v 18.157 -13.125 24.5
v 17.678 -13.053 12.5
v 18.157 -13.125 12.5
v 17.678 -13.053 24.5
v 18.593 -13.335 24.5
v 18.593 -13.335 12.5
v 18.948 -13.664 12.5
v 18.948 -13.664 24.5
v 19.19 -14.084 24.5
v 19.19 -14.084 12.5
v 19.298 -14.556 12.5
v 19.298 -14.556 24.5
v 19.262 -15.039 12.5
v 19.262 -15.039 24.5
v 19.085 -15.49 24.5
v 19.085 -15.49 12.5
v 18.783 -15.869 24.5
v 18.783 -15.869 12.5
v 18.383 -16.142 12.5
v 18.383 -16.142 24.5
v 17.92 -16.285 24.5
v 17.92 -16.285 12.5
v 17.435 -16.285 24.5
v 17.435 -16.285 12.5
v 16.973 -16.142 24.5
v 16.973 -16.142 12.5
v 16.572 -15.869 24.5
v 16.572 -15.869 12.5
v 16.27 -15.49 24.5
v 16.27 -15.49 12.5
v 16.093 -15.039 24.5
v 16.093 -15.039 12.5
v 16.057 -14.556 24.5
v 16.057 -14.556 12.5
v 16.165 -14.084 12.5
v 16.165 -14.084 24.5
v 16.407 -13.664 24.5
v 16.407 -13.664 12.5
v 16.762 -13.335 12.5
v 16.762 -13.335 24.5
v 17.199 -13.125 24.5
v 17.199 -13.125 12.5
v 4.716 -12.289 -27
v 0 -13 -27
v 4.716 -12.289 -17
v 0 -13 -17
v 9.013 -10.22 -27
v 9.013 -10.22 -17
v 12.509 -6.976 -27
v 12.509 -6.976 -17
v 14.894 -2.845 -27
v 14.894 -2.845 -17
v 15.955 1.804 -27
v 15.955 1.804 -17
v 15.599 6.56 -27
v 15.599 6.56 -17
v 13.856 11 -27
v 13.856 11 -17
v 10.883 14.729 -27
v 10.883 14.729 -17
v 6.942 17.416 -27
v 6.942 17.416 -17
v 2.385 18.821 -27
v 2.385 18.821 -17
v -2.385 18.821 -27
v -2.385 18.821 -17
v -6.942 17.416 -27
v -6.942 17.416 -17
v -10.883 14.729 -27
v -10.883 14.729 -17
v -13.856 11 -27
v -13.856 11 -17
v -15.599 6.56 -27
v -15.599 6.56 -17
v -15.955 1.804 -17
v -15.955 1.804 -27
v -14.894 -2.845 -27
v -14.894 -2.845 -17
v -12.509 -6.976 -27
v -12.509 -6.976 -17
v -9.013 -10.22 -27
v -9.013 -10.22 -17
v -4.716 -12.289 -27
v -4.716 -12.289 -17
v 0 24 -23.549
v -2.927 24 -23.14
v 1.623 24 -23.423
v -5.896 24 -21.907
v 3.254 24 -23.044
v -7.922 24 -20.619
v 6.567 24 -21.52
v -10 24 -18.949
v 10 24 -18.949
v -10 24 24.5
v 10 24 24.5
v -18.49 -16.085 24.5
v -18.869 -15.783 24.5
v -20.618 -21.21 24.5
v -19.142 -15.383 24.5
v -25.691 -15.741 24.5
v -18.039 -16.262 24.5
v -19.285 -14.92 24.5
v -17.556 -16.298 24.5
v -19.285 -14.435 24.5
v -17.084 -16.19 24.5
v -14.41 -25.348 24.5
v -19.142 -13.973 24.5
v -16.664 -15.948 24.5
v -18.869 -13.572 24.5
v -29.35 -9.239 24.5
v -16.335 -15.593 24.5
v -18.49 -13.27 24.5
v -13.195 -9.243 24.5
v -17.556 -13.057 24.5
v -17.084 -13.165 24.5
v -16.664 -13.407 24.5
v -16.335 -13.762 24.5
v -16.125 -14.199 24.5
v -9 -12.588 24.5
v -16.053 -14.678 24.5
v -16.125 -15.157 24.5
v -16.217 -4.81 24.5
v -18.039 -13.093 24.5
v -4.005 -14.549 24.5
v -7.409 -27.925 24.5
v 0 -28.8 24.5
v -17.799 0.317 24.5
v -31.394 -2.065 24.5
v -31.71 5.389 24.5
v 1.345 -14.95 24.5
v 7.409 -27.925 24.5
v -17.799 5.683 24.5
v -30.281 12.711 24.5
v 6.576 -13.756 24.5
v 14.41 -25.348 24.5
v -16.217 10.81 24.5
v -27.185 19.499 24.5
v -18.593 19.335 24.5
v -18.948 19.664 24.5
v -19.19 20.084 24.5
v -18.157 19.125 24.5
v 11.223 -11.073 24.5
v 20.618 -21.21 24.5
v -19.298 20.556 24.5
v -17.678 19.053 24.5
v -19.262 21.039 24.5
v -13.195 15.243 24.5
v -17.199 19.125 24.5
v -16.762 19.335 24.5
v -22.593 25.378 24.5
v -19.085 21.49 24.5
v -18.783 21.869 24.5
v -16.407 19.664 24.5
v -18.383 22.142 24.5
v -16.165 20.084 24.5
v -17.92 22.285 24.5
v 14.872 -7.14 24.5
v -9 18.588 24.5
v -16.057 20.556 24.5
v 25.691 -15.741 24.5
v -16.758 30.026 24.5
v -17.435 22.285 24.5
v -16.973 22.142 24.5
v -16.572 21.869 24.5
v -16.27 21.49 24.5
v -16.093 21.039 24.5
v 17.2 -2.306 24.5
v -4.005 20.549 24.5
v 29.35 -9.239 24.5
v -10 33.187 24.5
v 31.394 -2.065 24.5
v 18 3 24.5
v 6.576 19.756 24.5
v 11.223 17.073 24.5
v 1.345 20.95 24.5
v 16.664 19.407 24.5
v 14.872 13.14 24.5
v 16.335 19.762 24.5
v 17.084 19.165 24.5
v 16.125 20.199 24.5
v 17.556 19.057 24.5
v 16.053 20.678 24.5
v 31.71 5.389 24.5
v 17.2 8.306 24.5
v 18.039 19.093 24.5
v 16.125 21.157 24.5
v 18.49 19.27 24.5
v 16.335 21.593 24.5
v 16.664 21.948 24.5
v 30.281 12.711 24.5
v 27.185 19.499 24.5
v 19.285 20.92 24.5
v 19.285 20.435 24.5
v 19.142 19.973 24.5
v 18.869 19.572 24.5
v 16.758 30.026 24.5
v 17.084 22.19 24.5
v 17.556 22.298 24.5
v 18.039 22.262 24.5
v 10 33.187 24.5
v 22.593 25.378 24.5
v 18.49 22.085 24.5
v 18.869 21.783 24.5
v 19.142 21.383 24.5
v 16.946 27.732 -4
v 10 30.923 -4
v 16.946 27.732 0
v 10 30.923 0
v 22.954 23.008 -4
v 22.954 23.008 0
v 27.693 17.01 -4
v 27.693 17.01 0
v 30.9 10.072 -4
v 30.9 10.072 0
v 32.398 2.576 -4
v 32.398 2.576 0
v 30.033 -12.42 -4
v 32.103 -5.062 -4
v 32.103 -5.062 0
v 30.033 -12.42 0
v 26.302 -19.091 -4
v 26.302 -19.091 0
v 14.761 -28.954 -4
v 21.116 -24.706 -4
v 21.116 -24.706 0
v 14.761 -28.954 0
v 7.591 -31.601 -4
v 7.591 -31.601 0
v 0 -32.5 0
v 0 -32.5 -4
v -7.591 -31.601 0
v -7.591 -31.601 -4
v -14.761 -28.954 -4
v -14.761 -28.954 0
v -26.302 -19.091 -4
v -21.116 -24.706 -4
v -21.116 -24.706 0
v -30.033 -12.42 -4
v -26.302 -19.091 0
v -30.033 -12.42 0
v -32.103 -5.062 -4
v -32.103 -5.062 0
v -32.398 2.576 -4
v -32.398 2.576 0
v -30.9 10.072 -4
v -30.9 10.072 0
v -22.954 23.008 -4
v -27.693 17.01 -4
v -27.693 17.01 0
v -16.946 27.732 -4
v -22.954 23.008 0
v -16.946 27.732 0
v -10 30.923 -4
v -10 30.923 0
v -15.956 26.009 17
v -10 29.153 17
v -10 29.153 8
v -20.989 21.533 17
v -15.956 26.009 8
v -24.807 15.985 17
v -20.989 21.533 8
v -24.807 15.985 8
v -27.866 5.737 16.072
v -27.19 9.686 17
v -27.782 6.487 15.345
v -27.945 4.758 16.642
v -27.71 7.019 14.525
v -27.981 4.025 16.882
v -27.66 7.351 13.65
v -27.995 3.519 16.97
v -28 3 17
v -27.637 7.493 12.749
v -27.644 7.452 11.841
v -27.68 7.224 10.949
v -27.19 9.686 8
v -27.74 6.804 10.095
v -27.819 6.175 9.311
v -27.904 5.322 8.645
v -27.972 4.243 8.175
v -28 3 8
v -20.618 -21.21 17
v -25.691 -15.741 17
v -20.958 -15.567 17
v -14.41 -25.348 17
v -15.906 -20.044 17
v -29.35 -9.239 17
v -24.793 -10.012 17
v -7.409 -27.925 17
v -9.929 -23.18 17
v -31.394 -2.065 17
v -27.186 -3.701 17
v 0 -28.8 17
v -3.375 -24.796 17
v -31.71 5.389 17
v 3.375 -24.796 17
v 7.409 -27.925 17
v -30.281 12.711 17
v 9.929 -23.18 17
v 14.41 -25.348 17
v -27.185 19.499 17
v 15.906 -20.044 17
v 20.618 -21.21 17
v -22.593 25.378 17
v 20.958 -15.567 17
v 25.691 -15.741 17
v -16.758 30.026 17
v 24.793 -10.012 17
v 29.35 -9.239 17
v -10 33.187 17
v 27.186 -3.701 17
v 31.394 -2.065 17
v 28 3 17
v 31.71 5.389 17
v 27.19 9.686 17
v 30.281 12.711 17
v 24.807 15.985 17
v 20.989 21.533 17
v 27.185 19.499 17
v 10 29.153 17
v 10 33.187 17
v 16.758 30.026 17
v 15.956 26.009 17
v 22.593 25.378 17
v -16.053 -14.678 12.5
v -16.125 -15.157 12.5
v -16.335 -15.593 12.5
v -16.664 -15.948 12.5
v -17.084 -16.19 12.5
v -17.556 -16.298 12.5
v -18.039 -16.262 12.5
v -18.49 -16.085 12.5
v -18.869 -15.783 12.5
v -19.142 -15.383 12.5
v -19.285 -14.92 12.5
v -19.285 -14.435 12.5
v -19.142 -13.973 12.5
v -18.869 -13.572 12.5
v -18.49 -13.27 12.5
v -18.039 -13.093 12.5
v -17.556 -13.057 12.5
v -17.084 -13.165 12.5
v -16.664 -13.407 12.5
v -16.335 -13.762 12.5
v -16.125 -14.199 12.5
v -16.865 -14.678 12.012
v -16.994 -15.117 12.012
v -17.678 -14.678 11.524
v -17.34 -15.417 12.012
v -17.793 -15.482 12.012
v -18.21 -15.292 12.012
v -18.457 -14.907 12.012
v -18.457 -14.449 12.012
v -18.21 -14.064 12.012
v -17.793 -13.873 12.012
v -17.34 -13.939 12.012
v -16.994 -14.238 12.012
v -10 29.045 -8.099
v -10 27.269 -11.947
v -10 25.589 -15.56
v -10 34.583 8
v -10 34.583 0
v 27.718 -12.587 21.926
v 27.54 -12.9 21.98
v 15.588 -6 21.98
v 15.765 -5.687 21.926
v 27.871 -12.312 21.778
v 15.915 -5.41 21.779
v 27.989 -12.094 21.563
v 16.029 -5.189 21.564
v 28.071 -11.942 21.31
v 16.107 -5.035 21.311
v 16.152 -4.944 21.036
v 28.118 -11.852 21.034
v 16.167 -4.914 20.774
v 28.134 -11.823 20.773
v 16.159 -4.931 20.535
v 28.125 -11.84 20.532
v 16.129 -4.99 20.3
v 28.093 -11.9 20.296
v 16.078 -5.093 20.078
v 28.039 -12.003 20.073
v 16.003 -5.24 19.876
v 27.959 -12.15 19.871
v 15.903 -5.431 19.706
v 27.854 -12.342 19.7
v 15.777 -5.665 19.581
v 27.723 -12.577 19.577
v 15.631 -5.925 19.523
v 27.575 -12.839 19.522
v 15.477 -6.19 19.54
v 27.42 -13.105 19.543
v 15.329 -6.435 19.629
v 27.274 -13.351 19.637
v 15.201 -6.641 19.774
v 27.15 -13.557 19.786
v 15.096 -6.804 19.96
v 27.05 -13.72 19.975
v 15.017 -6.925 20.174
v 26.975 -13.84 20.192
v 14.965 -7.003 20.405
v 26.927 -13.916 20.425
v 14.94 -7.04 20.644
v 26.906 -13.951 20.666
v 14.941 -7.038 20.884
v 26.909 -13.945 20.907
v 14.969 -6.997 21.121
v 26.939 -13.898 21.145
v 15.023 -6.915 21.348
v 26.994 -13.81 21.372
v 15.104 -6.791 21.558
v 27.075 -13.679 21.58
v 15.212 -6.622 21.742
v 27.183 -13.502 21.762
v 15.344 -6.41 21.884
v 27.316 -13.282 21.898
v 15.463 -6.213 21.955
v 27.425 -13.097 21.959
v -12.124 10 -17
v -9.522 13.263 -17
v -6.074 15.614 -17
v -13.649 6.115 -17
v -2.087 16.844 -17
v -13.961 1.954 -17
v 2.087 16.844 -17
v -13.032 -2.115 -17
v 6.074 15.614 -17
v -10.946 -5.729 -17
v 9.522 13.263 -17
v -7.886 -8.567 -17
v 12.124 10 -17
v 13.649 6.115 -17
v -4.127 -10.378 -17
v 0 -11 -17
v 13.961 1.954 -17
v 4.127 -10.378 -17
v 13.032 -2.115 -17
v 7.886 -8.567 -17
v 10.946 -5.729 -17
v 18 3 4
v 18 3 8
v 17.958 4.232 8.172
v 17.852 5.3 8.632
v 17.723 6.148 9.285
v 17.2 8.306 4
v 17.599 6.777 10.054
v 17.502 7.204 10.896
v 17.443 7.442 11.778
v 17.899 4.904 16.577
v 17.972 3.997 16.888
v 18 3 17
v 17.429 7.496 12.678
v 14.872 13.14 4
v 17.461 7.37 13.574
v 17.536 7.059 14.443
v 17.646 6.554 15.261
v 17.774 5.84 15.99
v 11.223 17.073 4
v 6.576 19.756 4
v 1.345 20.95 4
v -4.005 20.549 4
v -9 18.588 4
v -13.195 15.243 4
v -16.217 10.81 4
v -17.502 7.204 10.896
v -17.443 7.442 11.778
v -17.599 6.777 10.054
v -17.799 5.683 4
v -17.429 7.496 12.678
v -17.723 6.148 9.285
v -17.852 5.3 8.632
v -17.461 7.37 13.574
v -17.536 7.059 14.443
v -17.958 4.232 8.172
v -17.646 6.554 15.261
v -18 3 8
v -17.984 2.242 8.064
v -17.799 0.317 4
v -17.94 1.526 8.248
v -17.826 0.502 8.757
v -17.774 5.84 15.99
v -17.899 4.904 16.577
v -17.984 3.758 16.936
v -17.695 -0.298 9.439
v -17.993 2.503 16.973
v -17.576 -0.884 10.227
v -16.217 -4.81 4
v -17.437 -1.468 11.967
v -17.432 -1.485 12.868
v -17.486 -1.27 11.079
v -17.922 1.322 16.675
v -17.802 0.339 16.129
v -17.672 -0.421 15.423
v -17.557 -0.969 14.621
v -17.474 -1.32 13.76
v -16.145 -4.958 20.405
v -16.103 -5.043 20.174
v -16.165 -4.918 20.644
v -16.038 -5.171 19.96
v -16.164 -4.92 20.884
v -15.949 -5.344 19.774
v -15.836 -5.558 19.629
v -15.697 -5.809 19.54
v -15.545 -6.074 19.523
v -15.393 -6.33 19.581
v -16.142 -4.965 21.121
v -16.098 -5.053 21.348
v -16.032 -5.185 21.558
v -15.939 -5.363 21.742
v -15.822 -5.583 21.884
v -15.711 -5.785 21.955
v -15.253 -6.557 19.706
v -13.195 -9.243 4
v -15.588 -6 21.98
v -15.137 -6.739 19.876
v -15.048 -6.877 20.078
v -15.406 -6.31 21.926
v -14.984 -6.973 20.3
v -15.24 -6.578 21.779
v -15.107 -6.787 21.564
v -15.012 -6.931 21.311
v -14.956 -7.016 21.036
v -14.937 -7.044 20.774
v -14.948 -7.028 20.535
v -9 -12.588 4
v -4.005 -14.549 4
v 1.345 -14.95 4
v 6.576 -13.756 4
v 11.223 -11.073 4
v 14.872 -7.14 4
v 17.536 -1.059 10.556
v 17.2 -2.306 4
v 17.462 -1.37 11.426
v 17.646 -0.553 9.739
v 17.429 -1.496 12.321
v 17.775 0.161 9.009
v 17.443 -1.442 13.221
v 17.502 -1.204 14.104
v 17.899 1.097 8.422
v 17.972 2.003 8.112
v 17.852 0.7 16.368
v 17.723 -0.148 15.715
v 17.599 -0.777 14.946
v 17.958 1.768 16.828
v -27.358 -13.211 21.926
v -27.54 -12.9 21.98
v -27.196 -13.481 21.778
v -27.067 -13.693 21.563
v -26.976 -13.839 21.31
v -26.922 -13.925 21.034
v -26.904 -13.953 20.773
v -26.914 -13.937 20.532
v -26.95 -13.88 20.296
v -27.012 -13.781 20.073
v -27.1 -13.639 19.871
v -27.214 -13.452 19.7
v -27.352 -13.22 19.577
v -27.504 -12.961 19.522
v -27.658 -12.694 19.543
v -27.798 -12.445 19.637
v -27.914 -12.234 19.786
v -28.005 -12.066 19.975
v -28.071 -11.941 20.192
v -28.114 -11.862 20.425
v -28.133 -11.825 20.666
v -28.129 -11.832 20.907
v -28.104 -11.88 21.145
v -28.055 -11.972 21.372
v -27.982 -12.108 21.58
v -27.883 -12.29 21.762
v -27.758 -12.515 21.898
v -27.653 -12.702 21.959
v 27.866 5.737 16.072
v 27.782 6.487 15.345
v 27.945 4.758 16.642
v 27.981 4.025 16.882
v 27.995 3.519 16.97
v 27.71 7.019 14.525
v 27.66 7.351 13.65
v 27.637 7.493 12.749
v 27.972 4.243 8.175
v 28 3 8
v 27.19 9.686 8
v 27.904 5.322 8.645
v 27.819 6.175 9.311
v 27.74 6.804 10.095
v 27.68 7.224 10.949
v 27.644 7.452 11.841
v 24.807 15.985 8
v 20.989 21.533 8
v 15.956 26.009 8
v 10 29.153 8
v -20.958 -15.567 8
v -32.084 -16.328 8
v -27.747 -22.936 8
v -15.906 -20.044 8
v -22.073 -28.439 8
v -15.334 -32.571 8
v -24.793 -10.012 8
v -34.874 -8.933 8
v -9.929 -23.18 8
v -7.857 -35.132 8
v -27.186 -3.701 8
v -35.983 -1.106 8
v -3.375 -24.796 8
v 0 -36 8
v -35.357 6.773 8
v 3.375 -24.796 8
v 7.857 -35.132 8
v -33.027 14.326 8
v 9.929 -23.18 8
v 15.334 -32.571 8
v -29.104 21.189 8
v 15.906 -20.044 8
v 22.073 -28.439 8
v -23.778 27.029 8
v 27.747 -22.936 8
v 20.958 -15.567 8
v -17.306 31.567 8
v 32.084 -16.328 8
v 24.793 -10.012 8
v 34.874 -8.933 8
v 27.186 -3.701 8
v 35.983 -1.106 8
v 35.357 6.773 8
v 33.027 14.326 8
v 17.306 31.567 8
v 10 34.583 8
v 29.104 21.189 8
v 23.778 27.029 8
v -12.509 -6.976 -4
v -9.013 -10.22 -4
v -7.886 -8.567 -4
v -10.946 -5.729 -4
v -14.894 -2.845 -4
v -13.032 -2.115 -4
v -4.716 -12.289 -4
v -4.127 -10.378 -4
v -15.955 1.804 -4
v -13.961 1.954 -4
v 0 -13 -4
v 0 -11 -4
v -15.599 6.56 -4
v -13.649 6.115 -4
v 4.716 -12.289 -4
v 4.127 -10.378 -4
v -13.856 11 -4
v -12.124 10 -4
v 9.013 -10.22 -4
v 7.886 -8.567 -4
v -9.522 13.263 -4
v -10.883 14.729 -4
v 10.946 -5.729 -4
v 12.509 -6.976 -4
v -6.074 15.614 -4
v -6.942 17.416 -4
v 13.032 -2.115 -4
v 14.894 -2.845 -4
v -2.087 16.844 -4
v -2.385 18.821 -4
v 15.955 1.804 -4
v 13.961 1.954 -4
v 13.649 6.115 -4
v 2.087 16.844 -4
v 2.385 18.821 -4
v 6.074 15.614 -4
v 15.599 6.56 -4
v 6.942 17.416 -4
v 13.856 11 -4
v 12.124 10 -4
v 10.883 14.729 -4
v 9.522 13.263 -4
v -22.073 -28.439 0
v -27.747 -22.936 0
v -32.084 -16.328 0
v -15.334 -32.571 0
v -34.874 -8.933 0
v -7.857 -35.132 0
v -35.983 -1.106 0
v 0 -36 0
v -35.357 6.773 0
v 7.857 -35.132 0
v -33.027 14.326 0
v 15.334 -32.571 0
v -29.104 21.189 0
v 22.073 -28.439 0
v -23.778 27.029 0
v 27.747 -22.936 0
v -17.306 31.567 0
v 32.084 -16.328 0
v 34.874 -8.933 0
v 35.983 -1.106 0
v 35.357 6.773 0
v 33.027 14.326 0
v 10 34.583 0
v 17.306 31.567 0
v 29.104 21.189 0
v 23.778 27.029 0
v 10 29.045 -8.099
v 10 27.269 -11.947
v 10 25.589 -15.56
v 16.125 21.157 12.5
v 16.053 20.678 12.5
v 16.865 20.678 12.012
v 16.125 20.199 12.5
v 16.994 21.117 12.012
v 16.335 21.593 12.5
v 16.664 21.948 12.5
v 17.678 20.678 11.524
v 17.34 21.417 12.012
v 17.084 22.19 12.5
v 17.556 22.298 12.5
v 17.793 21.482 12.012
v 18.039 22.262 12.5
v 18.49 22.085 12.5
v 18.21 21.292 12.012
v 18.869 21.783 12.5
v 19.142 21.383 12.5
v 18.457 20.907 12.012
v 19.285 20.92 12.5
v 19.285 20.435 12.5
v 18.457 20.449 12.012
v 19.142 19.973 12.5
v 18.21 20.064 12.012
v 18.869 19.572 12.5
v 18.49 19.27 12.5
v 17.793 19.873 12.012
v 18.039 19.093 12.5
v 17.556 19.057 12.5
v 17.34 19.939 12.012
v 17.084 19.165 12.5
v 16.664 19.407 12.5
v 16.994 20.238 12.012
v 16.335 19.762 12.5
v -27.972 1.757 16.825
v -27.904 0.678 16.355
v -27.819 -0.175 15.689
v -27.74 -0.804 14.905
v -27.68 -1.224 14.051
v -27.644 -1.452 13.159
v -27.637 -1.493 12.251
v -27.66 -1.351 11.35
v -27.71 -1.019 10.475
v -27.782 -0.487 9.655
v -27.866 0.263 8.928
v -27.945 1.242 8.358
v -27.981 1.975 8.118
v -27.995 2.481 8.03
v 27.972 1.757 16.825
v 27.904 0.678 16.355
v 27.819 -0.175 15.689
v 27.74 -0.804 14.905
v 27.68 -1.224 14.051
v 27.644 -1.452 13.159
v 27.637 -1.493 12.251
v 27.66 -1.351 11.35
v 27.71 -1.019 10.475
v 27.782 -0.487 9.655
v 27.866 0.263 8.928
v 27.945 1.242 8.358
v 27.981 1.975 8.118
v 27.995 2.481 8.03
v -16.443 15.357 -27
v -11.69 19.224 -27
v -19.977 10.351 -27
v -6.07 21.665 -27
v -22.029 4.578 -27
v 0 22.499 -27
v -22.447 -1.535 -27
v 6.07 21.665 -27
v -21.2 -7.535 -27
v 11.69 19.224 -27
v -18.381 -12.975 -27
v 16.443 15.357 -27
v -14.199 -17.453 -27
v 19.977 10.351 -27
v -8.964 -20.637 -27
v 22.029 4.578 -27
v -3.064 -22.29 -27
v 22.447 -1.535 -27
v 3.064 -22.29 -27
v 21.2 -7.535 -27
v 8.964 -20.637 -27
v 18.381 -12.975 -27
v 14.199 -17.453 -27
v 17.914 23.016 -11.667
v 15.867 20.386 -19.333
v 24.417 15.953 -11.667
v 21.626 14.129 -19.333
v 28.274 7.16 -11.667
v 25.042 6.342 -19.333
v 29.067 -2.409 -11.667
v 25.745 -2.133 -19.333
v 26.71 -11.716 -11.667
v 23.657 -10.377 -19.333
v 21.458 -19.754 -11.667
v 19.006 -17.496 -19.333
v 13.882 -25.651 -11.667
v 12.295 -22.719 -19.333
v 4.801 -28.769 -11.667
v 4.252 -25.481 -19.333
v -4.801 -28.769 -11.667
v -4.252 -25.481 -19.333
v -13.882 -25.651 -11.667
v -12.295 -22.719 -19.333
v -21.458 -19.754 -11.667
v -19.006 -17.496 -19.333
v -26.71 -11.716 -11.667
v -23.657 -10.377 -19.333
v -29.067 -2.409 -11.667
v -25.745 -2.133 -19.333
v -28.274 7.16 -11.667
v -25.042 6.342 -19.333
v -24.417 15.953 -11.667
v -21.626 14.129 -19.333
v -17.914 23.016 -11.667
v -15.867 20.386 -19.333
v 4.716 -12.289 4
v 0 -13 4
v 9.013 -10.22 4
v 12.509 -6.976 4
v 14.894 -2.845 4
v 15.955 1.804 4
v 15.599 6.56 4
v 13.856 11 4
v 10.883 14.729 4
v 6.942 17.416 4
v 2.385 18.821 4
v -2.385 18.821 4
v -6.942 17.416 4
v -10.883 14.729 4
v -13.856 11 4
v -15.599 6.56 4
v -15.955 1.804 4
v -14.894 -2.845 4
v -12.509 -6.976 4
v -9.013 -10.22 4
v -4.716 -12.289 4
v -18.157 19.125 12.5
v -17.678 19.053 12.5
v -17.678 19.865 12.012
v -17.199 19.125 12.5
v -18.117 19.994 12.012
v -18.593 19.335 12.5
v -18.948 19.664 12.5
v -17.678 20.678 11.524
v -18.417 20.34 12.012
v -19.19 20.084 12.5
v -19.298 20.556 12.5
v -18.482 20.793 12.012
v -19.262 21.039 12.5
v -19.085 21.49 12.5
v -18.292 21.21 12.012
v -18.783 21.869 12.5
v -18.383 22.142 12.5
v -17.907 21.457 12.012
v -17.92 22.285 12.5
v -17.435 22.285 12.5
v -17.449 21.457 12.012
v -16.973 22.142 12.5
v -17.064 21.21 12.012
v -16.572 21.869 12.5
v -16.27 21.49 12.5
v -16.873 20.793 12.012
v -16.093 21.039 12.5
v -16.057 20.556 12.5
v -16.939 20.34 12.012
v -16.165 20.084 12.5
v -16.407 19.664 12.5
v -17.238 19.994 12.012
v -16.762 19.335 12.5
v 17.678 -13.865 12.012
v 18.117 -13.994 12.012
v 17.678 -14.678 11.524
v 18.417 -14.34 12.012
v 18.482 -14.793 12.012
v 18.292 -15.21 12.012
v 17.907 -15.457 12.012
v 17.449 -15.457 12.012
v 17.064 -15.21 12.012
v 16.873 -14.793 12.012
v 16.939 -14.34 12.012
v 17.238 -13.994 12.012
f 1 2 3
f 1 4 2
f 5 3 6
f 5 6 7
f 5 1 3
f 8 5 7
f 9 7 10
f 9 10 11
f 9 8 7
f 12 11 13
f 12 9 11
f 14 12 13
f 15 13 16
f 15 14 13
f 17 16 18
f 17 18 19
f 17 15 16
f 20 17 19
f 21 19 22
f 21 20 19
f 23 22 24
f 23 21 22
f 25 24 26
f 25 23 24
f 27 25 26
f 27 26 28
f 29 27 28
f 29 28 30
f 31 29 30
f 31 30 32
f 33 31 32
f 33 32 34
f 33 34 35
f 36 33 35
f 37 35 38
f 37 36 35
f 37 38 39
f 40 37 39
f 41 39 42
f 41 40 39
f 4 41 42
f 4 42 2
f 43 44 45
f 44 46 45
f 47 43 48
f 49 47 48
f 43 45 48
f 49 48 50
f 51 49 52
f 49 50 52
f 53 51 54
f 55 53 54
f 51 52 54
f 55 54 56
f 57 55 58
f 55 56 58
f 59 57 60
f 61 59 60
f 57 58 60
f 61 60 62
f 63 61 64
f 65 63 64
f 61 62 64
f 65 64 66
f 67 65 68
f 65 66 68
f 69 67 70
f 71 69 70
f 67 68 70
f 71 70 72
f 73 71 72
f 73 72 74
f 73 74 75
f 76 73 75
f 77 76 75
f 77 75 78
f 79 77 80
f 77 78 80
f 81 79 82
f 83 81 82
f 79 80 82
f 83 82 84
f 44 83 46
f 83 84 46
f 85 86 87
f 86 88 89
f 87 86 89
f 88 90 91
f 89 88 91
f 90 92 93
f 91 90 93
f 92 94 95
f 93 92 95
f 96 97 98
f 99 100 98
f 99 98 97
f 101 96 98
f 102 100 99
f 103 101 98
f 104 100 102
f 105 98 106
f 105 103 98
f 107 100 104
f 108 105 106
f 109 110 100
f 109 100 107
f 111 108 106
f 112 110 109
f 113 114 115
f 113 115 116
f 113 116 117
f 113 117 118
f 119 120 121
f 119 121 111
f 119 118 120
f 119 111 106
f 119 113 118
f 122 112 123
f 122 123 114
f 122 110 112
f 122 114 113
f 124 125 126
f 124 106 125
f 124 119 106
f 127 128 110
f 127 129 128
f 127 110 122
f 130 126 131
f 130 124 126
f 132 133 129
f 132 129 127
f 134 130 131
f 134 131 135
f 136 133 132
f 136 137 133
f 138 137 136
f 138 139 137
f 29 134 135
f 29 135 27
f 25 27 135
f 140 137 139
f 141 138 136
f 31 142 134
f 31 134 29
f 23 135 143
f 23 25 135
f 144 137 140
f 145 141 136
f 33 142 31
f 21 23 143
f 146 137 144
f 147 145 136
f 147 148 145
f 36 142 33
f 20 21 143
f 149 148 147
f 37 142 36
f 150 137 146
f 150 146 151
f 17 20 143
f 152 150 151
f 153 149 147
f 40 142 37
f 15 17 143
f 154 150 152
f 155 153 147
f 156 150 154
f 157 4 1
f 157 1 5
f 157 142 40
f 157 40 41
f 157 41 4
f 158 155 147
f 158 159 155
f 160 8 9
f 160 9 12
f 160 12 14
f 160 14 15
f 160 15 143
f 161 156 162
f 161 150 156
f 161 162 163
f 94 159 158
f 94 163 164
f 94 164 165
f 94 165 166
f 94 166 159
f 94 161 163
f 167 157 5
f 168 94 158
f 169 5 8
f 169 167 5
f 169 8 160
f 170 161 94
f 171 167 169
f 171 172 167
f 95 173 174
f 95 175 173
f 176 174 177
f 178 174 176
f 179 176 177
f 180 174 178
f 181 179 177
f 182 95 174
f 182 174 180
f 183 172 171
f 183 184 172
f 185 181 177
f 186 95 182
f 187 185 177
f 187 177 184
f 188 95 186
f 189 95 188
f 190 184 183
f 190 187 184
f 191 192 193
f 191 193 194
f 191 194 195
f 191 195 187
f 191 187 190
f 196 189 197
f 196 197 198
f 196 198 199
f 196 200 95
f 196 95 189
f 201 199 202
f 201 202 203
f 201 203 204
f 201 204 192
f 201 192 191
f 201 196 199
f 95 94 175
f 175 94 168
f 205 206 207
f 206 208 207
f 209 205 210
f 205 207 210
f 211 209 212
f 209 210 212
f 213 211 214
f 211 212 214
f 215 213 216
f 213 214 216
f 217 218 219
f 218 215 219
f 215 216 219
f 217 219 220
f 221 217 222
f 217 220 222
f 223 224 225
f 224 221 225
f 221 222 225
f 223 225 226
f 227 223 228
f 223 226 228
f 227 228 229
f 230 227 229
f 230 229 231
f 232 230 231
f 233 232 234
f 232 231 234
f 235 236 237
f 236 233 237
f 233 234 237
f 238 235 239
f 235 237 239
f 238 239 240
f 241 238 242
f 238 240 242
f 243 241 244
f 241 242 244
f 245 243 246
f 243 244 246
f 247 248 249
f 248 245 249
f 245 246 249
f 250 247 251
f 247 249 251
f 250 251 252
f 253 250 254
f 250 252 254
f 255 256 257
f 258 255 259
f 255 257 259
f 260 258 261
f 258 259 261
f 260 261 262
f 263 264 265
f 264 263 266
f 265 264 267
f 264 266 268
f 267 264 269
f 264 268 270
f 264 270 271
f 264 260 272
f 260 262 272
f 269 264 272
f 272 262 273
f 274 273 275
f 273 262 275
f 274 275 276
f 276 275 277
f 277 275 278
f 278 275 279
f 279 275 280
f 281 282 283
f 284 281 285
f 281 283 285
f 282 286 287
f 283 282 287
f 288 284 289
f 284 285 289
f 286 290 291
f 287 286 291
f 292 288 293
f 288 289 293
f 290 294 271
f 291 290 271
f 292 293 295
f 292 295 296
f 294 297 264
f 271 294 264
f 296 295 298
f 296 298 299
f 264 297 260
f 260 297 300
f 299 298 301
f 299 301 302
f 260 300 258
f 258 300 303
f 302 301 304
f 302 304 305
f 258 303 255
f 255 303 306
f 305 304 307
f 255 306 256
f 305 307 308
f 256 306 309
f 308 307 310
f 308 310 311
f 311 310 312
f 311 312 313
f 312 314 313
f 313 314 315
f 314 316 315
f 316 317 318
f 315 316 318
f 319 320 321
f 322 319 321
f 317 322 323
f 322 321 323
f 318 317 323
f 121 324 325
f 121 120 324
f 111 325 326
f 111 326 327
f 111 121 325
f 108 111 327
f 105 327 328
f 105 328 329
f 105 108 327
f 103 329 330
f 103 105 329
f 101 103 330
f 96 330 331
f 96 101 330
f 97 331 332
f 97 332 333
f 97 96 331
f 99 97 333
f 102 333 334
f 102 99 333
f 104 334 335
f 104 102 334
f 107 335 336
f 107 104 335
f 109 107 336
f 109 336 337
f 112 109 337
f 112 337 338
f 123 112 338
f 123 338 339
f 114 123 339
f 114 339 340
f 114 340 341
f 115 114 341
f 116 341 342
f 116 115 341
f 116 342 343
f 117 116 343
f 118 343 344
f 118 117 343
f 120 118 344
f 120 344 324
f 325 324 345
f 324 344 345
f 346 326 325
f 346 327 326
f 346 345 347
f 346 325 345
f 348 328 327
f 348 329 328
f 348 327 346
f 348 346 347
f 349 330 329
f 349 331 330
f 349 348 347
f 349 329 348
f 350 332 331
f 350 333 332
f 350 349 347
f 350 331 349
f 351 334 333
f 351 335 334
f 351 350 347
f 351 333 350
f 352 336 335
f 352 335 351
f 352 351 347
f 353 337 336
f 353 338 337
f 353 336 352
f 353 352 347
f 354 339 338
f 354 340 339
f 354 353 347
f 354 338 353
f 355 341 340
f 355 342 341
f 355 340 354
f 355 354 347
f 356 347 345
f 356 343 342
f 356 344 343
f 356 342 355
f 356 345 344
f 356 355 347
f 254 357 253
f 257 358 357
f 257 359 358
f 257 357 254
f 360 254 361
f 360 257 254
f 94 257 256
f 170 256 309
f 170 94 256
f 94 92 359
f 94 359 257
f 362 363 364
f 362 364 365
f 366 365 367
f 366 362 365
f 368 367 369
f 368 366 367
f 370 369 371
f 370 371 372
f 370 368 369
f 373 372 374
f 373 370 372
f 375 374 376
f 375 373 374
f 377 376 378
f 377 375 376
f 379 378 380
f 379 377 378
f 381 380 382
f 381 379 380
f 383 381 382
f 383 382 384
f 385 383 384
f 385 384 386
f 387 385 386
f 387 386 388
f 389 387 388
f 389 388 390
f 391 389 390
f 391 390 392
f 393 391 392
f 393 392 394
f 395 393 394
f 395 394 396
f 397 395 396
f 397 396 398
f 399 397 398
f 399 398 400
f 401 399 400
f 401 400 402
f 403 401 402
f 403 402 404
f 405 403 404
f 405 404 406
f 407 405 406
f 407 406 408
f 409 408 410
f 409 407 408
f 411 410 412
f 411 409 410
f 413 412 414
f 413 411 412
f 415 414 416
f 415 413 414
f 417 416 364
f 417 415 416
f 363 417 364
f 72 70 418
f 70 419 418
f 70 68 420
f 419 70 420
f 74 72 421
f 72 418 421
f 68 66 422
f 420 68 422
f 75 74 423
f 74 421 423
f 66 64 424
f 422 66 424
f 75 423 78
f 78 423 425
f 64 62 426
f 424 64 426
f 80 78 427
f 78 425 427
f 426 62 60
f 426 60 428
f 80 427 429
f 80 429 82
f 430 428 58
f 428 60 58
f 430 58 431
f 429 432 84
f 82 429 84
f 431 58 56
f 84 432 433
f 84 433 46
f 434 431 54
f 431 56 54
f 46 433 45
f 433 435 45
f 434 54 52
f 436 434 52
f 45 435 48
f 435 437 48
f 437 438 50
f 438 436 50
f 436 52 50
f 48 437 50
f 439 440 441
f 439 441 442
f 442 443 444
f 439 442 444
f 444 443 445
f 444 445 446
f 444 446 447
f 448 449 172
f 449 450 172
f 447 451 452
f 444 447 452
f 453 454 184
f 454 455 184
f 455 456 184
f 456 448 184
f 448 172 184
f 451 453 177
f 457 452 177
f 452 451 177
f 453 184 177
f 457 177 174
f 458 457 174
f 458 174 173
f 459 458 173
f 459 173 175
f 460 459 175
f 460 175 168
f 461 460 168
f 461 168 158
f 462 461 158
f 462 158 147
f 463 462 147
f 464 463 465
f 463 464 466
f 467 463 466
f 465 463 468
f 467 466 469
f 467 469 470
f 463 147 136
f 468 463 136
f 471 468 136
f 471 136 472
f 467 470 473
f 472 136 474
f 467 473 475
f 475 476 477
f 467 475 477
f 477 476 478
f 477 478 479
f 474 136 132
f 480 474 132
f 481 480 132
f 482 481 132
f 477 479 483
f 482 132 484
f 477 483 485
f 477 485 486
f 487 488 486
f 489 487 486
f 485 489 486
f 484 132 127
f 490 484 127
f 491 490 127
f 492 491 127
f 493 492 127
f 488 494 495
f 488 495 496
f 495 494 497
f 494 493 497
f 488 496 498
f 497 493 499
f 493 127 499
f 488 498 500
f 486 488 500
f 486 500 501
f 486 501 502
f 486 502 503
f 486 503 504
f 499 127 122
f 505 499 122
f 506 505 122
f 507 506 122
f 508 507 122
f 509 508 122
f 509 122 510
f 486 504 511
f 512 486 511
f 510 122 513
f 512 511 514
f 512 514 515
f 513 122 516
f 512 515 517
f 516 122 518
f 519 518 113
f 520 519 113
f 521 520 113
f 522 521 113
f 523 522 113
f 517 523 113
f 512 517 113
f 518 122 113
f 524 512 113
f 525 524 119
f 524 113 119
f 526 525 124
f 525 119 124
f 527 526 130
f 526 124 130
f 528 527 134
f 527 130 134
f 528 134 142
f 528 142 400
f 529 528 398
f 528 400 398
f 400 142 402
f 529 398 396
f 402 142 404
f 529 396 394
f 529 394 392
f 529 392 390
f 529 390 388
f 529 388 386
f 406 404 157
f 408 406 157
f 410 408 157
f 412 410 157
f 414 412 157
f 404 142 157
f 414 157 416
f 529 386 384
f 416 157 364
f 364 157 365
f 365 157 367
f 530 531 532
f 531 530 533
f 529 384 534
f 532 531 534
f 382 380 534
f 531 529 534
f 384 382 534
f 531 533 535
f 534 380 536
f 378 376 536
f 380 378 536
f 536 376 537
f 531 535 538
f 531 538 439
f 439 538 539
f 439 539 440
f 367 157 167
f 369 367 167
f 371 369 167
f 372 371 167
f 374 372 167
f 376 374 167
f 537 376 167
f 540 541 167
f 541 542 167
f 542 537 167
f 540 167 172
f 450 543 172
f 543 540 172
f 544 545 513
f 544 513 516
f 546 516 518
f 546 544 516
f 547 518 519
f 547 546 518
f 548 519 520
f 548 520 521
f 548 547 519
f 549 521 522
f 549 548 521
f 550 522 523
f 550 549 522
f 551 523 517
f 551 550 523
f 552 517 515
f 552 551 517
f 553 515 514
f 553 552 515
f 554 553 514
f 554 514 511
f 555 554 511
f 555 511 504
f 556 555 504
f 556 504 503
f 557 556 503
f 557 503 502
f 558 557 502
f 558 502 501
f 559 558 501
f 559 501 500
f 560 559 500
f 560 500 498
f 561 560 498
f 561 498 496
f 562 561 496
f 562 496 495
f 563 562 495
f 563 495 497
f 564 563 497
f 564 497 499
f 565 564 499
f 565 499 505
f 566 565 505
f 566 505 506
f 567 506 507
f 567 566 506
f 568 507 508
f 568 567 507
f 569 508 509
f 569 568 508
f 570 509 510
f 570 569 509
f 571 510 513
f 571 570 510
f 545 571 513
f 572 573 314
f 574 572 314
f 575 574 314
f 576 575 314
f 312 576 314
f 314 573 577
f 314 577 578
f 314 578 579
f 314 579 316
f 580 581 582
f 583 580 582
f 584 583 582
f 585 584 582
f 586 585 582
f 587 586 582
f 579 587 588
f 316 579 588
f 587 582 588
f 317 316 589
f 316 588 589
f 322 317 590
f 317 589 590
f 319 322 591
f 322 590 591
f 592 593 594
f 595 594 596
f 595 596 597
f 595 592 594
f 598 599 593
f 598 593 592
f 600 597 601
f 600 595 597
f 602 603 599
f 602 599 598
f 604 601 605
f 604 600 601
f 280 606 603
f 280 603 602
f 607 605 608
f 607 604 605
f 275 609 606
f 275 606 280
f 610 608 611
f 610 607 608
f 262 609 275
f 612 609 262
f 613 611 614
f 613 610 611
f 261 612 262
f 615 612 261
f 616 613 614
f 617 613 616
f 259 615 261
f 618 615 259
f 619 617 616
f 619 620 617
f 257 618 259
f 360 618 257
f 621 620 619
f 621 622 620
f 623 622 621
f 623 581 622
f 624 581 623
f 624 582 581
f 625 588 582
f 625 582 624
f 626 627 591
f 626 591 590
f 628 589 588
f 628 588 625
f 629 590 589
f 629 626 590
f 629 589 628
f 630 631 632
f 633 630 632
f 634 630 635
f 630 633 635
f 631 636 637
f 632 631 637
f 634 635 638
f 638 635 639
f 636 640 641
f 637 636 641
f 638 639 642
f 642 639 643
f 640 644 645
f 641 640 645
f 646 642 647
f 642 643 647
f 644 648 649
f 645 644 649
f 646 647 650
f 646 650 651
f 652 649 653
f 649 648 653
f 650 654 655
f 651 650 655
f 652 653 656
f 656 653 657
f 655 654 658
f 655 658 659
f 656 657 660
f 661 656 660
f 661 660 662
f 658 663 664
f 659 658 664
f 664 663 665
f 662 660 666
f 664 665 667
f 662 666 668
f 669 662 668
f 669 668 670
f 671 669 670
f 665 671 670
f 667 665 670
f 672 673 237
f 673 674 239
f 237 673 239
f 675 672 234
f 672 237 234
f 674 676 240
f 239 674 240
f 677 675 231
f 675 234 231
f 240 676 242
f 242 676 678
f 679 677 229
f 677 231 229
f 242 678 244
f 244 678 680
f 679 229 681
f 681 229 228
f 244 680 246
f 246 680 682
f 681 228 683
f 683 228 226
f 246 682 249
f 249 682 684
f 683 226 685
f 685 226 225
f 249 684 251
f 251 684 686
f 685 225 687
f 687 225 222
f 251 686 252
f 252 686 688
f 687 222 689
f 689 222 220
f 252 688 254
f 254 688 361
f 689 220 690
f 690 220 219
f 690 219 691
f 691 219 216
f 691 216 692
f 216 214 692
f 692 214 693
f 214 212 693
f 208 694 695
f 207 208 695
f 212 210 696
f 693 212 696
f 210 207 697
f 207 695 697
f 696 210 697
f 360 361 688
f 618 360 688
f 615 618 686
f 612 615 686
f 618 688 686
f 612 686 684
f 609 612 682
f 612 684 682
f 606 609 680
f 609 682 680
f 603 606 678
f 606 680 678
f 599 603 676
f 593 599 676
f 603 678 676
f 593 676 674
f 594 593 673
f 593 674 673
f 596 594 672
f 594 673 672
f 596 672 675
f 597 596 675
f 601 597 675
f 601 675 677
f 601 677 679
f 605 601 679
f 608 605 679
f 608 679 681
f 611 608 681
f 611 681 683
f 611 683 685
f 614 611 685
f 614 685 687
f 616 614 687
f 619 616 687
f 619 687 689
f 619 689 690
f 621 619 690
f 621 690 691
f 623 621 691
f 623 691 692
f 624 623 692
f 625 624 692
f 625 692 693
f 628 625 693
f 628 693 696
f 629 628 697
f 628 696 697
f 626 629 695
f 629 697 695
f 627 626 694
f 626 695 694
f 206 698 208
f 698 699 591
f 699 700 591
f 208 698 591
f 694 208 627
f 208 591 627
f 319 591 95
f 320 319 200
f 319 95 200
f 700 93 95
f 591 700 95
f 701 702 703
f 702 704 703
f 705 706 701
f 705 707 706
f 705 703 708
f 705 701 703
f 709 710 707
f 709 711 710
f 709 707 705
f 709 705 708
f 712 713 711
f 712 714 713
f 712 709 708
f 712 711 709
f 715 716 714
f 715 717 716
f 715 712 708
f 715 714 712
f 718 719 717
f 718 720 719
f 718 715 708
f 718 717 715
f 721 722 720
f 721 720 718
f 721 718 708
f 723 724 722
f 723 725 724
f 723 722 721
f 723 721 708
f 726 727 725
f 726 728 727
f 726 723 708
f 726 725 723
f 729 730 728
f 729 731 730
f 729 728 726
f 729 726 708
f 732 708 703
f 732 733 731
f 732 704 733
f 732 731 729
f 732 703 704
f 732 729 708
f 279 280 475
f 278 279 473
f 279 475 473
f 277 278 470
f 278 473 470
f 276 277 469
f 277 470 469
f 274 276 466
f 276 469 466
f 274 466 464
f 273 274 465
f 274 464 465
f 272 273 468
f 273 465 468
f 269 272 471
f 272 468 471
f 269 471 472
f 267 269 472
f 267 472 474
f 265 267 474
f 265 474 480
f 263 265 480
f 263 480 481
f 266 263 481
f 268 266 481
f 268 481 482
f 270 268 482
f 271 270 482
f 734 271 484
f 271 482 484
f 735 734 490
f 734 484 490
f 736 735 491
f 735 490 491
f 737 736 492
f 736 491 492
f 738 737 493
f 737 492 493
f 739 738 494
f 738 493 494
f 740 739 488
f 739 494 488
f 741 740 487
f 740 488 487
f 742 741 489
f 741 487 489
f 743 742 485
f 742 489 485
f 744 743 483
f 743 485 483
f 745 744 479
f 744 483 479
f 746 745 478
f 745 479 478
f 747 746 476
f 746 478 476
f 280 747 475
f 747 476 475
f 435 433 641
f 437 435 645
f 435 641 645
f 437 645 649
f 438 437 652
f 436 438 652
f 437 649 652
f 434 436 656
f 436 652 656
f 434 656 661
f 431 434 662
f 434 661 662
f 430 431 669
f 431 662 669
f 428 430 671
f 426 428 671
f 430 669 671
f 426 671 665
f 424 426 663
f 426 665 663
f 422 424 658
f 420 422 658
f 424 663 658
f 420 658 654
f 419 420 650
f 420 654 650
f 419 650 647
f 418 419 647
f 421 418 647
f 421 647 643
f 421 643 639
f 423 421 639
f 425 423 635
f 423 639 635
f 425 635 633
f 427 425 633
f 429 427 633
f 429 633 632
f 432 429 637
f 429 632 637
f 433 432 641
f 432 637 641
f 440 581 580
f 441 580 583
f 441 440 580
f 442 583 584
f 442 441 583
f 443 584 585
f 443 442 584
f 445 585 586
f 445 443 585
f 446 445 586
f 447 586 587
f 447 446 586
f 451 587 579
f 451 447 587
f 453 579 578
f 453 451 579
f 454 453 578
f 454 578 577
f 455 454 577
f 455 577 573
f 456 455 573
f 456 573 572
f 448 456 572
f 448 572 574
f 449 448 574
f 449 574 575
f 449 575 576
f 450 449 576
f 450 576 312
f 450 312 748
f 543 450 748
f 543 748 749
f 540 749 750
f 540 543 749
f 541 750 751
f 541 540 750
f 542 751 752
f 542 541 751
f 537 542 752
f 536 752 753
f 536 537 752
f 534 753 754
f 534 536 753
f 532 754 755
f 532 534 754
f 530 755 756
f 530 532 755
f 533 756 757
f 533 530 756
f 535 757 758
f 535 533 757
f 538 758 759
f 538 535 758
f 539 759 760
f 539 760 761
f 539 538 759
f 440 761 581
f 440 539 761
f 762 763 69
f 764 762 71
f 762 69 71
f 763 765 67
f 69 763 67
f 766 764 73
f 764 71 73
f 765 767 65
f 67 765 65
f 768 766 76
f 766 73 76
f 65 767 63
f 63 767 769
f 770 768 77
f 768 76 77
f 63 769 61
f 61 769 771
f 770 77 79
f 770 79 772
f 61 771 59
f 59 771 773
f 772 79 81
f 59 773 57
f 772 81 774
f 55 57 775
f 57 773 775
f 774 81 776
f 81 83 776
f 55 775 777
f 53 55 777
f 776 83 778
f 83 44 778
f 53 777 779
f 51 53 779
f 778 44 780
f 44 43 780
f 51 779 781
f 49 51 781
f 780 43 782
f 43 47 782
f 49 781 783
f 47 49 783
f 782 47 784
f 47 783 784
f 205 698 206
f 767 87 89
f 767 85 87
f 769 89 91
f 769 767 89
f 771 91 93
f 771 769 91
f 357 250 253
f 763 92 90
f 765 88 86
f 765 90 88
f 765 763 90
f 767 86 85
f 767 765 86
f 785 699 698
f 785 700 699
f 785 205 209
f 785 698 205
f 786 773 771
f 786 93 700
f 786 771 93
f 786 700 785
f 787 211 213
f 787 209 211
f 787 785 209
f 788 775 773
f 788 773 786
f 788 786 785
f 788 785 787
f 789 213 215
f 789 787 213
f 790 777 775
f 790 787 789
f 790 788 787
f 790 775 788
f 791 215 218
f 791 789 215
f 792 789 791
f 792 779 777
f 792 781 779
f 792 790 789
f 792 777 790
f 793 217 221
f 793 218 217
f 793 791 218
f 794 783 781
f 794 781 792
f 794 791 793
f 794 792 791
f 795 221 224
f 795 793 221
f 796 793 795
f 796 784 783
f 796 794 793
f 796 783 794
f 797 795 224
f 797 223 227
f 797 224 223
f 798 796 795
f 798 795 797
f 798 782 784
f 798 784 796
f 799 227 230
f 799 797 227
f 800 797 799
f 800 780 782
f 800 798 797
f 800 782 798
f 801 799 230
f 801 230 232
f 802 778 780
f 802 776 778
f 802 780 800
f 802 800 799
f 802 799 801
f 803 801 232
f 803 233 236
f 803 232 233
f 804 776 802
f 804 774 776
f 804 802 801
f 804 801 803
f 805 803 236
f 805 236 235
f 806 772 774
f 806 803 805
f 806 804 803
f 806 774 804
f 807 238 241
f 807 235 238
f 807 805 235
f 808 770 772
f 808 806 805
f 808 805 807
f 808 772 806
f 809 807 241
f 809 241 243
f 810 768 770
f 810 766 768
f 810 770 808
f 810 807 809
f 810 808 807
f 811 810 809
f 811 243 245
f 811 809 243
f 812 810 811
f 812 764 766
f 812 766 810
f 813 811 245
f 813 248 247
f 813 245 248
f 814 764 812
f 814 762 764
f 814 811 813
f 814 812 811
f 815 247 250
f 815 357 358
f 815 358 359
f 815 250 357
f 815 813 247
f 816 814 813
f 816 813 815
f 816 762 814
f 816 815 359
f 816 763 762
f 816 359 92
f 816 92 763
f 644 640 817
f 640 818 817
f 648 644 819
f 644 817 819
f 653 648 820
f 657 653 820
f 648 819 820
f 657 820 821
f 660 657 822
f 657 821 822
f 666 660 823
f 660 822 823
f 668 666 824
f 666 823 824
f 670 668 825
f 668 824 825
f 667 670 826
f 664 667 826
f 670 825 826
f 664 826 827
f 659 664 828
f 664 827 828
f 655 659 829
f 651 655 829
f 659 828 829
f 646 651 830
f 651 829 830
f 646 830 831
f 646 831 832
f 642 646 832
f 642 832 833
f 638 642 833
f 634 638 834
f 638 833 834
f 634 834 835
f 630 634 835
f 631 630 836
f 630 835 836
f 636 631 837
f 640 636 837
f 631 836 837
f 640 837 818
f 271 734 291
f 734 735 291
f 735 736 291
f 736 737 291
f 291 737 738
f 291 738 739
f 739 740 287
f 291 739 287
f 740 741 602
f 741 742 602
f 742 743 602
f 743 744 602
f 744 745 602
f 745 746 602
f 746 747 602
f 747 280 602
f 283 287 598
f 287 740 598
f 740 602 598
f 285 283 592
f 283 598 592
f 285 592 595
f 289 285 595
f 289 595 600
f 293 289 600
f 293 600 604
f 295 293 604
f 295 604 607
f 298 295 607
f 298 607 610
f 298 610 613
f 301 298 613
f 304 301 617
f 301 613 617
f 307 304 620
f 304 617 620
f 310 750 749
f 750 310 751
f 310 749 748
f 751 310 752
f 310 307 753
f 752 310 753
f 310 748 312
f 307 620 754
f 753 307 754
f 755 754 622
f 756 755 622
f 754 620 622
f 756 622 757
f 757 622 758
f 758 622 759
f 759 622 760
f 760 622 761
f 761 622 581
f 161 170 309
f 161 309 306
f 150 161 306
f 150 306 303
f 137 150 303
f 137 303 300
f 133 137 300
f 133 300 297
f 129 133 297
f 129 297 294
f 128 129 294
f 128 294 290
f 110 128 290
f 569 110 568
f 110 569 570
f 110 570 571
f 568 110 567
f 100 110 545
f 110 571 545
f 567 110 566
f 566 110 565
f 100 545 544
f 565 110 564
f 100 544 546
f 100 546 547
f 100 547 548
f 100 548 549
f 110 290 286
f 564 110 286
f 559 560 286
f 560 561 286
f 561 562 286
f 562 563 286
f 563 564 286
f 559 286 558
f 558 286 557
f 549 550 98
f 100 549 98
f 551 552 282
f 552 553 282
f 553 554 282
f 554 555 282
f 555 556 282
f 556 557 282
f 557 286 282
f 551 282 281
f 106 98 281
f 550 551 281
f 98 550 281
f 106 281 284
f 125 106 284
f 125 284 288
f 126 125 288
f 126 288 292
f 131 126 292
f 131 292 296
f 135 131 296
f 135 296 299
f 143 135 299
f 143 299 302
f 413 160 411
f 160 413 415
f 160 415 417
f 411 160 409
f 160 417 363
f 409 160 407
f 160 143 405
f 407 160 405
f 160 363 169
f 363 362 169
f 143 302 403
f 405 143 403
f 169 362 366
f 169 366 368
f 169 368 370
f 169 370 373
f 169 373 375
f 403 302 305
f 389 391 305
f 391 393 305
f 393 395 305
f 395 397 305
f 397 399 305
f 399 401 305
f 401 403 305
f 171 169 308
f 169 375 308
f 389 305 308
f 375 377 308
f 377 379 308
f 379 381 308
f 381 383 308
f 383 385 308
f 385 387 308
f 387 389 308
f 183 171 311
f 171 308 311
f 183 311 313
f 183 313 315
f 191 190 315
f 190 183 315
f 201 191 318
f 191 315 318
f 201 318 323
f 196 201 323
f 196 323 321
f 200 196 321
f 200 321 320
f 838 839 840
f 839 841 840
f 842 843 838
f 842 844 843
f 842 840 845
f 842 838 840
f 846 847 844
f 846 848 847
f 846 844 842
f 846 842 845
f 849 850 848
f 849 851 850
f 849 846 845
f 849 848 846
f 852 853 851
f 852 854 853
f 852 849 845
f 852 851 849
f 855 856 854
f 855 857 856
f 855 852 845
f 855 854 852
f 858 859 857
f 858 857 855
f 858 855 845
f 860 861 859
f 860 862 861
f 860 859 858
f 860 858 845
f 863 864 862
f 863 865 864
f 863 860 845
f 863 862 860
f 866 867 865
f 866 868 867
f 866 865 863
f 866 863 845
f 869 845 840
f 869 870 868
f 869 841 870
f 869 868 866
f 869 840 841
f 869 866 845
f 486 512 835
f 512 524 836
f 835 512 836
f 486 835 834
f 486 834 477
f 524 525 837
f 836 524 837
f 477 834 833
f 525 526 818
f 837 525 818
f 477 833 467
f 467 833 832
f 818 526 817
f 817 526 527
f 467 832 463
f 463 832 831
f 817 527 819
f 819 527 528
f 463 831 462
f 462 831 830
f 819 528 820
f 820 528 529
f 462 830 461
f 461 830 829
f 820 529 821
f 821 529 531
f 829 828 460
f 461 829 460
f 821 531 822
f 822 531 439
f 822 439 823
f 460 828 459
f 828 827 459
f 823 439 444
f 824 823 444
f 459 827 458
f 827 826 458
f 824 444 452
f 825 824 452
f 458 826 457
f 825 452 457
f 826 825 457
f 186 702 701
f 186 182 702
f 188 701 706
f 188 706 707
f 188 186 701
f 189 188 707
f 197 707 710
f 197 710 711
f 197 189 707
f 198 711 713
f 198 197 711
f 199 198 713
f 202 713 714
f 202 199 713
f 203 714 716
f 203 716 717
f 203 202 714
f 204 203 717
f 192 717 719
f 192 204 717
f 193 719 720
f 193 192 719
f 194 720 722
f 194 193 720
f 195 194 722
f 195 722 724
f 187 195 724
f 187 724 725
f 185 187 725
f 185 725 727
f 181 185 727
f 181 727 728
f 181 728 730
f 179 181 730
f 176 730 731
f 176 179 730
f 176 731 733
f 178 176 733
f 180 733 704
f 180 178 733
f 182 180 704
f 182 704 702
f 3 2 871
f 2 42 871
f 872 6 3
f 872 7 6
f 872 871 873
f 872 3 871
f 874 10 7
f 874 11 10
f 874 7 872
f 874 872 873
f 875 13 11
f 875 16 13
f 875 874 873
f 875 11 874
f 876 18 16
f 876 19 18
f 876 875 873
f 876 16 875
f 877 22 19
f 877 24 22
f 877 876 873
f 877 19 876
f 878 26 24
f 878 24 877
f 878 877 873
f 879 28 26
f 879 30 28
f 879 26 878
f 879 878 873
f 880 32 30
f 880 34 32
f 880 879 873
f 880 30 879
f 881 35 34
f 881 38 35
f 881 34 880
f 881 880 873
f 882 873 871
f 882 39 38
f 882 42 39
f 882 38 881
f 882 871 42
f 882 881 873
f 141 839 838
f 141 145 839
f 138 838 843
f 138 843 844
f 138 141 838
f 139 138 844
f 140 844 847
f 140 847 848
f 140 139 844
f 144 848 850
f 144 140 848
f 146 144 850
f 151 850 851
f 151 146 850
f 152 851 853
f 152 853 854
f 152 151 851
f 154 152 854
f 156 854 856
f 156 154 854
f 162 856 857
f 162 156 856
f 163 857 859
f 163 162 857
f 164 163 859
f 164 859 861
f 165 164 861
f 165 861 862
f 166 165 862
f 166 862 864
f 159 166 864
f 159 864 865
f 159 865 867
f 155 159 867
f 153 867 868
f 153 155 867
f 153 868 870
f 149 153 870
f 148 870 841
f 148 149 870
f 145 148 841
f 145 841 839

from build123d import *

# Parameters (mm, degrees)
ESQUISSE1_R                  = 36
BASE_EXTRUSION_DEPTH         = 8
ESQUISSE2_R                  = 32.5
BOSS_EXTRU_1_DEPTH           = 4
ESQUISSE4_R                  = 28
BOSS_EXTRU_2_DEPTH           = 9
ESQUISSE5_R                  = 31.8
BOSS_EXTRU_3_DEPTH           = 7.5
ESQUISSE6_R                  = 18
ENL_V_MAT_EXTRU_1_DEPTH      = 52.5
ESQUISSE10_W                 = 20
ESQUISSE10_H                 = 14.61003861
ENL_V_MAT_EXTRU_5_DEPTH      = 52.5
R_P_TITION_CIRCULAIRE1_COUNT = 4
ESQUISSE13_R                 = 4.5
ENL_V_MAT_EXTRU_6_DEPTH      = 37
ENL_V_MAT_EXTRU_6_DEPTH_BACK = 37
ENL_V_START                  = -31.8
ESQUISSE14_R                 = 1.23
ENL_V_MAT_EXTRU_7_DEPTH      = 13.842074
R_P_TITION_CIRCULAIRE2_COUNT = 2
R_P_TITION_CIRCULAIRE2_ANGLE = 120


with BuildPart() as part:
    # Esquisse1 → Base-Extrusion (new body)
    with BuildSketch(Plane.XY):
        Circle(ESQUISSE1_R)
    extrude(amount=BASE_EXTRUSION_DEPTH)

    # Esquisse2 → Boss.-Extru.1 (add)
    with BuildSketch(Plane(origin=(0, 0, 0), x_dir=(-1, 0, 0), z_dir=(0, 0, -1))):
        Circle(ESQUISSE2_R)
    extrude(amount=BOSS_EXTRU_1_DEPTH)

    # Esquisse3 → Boss.-Révol.1 (revolve)
    with BuildSketch(Plane(origin=(0, 0, 0), x_dir=(0, 0, -1), z_dir=(1, 0, 0))):
        Polygon((4, 32.5), (27, 22.499315376), (27, 0), (4, 0), align=None)
    revolve(axis=Axis((0, 0, 0), (0, 0, -1)))

    # Esquisse4 → Boss.-Extru.2 (add)
    with BuildSketch(Plane.XY.offset(8)):
        with Locations((0, 3)):
            Circle(ESQUISSE4_R)
    extrude(amount=BOSS_EXTRU_2_DEPTH)

    # Esquisse5 → Boss.-Extru.3 (add)
    with BuildSketch(Plane.XY.offset(17)):
        with Locations((0, 3)):
            Circle(ESQUISSE5_R)
    extrude(amount=BOSS_EXTRU_3_DEPTH)

    # Esquisse6 → Enlèv. mat.-Extru.1 (cut, through all)
    with BuildSketch(Plane.XY.offset(24.5)):
        with Locations((0, 3)):
            Circle(ESQUISSE6_R)
    extrude(amount=-ENL_V_MAT_EXTRU_1_DEPTH, mode=Mode.SUBTRACT)

    # Esquisse10 → Enlèv. mat.-Extru.5 (cut, through all)
    with BuildSketch(Plane.XY.offset(24.5)):
        with Locations((0, 31.305019305)):
            Rectangle(ESQUISSE10_W, ESQUISSE10_H)
    extrude(amount=-ENL_V_MAT_EXTRU_5_DEPTH, mode=Mode.SUBTRACT)

    # Esquisse11 → Perçage1 (revolve, cut)
    with BuildSketch(Plane(origin=(-17.67766953, 20.67766953, 24.5), x_dir=(0, -1, 0), z_dir=(1, 0, 0))):
        Polygon((0, 0), (0, 12.976398506), (1.625, 12), (1.625, 0), align=None)
    per_age1 = revolve(axis=Axis((-17.67766953, 20.67766953, 28.744199587), (0, 0, -1)), mode=Mode.SUBTRACT)

    # Répétition circulaire1: Perçage1 ×4 about axis
    r_p_tition_circulaire1_axis = Axis((0, 3, 0), (0, 0, 1))
    for i in range(1, R_P_TITION_CIRCULAIRE1_COUNT):
        add(per_age1.rotate(r_p_tition_circulaire1_axis, i * 360 / R_P_TITION_CIRCULAIRE1_COUNT), mode=Mode.SUBTRACT)

    # Esquisse13 → Enlèv. mat.-Extru.6 (cut, two sides)
    with BuildSketch(Plane(origin=(0, 0, 0), x_dir=(0, 0, -1), z_dir=(1, 0, 0))) as enl_v_mat_extru_6_sk:
        with Locations((-12.5, 3)):
            Circle(ESQUISSE13_R)
    extrude(amount=ENL_V_MAT_EXTRU_6_DEPTH, mode=Mode.SUBTRACT)
    extrude(enl_v_mat_extru_6_sk.sketch, amount=-ENL_V_MAT_EXTRU_6_DEPTH_BACK, mode=Mode.SUBTRACT)

    # Esquisse14 → Enlèv. mat.-Extru.7 (cut)
    with BuildSketch(Plane(origin=(-1.299038106, 0.75, 0), x_dir=(0, 0, 1), z_dir=(-0.866025404, 0.5, 0)).offset(ENL_V_START)):
        with Locations((20.75, 2.598076211)):
            Circle(ESQUISSE14_R)
    enl_v_mat_extru_7 = extrude(amount=ENL_V_MAT_EXTRU_7_DEPTH, mode=Mode.SUBTRACT)

    # Répétition circulaire2: Enlèv. mat.-Extru.7 ×2 about axis
    r_p_tition_circulaire2_axis = Axis((0, 3, 0), (0, 0, -1))
    for i in range(1, R_P_TITION_CIRCULAIRE2_COUNT):
        add(enl_v_mat_extru_7.rotate(r_p_tition_circulaire2_axis, i * R_P_TITION_CIRCULAIRE2_ANGLE / (R_P_TITION_CIRCULAIRE2_COUNT - 1)), mode=Mode.SUBTRACT)

    # Esquisse16 → Révolution1 (revolve)
    with BuildSketch(Plane(origin=(0, 0, 0), x_dir=(0, 0, -1), z_dir=(1, 0, 0))):
        Polygon((27, -15), (27, -13), (17, -13), (17, -11), (4, -11), (4, -13), (-4, -13), (-4, -15), align=None)
    revolve(axis=Axis((0, 3, -27), (0, 0, 1)))


solid = part.part
